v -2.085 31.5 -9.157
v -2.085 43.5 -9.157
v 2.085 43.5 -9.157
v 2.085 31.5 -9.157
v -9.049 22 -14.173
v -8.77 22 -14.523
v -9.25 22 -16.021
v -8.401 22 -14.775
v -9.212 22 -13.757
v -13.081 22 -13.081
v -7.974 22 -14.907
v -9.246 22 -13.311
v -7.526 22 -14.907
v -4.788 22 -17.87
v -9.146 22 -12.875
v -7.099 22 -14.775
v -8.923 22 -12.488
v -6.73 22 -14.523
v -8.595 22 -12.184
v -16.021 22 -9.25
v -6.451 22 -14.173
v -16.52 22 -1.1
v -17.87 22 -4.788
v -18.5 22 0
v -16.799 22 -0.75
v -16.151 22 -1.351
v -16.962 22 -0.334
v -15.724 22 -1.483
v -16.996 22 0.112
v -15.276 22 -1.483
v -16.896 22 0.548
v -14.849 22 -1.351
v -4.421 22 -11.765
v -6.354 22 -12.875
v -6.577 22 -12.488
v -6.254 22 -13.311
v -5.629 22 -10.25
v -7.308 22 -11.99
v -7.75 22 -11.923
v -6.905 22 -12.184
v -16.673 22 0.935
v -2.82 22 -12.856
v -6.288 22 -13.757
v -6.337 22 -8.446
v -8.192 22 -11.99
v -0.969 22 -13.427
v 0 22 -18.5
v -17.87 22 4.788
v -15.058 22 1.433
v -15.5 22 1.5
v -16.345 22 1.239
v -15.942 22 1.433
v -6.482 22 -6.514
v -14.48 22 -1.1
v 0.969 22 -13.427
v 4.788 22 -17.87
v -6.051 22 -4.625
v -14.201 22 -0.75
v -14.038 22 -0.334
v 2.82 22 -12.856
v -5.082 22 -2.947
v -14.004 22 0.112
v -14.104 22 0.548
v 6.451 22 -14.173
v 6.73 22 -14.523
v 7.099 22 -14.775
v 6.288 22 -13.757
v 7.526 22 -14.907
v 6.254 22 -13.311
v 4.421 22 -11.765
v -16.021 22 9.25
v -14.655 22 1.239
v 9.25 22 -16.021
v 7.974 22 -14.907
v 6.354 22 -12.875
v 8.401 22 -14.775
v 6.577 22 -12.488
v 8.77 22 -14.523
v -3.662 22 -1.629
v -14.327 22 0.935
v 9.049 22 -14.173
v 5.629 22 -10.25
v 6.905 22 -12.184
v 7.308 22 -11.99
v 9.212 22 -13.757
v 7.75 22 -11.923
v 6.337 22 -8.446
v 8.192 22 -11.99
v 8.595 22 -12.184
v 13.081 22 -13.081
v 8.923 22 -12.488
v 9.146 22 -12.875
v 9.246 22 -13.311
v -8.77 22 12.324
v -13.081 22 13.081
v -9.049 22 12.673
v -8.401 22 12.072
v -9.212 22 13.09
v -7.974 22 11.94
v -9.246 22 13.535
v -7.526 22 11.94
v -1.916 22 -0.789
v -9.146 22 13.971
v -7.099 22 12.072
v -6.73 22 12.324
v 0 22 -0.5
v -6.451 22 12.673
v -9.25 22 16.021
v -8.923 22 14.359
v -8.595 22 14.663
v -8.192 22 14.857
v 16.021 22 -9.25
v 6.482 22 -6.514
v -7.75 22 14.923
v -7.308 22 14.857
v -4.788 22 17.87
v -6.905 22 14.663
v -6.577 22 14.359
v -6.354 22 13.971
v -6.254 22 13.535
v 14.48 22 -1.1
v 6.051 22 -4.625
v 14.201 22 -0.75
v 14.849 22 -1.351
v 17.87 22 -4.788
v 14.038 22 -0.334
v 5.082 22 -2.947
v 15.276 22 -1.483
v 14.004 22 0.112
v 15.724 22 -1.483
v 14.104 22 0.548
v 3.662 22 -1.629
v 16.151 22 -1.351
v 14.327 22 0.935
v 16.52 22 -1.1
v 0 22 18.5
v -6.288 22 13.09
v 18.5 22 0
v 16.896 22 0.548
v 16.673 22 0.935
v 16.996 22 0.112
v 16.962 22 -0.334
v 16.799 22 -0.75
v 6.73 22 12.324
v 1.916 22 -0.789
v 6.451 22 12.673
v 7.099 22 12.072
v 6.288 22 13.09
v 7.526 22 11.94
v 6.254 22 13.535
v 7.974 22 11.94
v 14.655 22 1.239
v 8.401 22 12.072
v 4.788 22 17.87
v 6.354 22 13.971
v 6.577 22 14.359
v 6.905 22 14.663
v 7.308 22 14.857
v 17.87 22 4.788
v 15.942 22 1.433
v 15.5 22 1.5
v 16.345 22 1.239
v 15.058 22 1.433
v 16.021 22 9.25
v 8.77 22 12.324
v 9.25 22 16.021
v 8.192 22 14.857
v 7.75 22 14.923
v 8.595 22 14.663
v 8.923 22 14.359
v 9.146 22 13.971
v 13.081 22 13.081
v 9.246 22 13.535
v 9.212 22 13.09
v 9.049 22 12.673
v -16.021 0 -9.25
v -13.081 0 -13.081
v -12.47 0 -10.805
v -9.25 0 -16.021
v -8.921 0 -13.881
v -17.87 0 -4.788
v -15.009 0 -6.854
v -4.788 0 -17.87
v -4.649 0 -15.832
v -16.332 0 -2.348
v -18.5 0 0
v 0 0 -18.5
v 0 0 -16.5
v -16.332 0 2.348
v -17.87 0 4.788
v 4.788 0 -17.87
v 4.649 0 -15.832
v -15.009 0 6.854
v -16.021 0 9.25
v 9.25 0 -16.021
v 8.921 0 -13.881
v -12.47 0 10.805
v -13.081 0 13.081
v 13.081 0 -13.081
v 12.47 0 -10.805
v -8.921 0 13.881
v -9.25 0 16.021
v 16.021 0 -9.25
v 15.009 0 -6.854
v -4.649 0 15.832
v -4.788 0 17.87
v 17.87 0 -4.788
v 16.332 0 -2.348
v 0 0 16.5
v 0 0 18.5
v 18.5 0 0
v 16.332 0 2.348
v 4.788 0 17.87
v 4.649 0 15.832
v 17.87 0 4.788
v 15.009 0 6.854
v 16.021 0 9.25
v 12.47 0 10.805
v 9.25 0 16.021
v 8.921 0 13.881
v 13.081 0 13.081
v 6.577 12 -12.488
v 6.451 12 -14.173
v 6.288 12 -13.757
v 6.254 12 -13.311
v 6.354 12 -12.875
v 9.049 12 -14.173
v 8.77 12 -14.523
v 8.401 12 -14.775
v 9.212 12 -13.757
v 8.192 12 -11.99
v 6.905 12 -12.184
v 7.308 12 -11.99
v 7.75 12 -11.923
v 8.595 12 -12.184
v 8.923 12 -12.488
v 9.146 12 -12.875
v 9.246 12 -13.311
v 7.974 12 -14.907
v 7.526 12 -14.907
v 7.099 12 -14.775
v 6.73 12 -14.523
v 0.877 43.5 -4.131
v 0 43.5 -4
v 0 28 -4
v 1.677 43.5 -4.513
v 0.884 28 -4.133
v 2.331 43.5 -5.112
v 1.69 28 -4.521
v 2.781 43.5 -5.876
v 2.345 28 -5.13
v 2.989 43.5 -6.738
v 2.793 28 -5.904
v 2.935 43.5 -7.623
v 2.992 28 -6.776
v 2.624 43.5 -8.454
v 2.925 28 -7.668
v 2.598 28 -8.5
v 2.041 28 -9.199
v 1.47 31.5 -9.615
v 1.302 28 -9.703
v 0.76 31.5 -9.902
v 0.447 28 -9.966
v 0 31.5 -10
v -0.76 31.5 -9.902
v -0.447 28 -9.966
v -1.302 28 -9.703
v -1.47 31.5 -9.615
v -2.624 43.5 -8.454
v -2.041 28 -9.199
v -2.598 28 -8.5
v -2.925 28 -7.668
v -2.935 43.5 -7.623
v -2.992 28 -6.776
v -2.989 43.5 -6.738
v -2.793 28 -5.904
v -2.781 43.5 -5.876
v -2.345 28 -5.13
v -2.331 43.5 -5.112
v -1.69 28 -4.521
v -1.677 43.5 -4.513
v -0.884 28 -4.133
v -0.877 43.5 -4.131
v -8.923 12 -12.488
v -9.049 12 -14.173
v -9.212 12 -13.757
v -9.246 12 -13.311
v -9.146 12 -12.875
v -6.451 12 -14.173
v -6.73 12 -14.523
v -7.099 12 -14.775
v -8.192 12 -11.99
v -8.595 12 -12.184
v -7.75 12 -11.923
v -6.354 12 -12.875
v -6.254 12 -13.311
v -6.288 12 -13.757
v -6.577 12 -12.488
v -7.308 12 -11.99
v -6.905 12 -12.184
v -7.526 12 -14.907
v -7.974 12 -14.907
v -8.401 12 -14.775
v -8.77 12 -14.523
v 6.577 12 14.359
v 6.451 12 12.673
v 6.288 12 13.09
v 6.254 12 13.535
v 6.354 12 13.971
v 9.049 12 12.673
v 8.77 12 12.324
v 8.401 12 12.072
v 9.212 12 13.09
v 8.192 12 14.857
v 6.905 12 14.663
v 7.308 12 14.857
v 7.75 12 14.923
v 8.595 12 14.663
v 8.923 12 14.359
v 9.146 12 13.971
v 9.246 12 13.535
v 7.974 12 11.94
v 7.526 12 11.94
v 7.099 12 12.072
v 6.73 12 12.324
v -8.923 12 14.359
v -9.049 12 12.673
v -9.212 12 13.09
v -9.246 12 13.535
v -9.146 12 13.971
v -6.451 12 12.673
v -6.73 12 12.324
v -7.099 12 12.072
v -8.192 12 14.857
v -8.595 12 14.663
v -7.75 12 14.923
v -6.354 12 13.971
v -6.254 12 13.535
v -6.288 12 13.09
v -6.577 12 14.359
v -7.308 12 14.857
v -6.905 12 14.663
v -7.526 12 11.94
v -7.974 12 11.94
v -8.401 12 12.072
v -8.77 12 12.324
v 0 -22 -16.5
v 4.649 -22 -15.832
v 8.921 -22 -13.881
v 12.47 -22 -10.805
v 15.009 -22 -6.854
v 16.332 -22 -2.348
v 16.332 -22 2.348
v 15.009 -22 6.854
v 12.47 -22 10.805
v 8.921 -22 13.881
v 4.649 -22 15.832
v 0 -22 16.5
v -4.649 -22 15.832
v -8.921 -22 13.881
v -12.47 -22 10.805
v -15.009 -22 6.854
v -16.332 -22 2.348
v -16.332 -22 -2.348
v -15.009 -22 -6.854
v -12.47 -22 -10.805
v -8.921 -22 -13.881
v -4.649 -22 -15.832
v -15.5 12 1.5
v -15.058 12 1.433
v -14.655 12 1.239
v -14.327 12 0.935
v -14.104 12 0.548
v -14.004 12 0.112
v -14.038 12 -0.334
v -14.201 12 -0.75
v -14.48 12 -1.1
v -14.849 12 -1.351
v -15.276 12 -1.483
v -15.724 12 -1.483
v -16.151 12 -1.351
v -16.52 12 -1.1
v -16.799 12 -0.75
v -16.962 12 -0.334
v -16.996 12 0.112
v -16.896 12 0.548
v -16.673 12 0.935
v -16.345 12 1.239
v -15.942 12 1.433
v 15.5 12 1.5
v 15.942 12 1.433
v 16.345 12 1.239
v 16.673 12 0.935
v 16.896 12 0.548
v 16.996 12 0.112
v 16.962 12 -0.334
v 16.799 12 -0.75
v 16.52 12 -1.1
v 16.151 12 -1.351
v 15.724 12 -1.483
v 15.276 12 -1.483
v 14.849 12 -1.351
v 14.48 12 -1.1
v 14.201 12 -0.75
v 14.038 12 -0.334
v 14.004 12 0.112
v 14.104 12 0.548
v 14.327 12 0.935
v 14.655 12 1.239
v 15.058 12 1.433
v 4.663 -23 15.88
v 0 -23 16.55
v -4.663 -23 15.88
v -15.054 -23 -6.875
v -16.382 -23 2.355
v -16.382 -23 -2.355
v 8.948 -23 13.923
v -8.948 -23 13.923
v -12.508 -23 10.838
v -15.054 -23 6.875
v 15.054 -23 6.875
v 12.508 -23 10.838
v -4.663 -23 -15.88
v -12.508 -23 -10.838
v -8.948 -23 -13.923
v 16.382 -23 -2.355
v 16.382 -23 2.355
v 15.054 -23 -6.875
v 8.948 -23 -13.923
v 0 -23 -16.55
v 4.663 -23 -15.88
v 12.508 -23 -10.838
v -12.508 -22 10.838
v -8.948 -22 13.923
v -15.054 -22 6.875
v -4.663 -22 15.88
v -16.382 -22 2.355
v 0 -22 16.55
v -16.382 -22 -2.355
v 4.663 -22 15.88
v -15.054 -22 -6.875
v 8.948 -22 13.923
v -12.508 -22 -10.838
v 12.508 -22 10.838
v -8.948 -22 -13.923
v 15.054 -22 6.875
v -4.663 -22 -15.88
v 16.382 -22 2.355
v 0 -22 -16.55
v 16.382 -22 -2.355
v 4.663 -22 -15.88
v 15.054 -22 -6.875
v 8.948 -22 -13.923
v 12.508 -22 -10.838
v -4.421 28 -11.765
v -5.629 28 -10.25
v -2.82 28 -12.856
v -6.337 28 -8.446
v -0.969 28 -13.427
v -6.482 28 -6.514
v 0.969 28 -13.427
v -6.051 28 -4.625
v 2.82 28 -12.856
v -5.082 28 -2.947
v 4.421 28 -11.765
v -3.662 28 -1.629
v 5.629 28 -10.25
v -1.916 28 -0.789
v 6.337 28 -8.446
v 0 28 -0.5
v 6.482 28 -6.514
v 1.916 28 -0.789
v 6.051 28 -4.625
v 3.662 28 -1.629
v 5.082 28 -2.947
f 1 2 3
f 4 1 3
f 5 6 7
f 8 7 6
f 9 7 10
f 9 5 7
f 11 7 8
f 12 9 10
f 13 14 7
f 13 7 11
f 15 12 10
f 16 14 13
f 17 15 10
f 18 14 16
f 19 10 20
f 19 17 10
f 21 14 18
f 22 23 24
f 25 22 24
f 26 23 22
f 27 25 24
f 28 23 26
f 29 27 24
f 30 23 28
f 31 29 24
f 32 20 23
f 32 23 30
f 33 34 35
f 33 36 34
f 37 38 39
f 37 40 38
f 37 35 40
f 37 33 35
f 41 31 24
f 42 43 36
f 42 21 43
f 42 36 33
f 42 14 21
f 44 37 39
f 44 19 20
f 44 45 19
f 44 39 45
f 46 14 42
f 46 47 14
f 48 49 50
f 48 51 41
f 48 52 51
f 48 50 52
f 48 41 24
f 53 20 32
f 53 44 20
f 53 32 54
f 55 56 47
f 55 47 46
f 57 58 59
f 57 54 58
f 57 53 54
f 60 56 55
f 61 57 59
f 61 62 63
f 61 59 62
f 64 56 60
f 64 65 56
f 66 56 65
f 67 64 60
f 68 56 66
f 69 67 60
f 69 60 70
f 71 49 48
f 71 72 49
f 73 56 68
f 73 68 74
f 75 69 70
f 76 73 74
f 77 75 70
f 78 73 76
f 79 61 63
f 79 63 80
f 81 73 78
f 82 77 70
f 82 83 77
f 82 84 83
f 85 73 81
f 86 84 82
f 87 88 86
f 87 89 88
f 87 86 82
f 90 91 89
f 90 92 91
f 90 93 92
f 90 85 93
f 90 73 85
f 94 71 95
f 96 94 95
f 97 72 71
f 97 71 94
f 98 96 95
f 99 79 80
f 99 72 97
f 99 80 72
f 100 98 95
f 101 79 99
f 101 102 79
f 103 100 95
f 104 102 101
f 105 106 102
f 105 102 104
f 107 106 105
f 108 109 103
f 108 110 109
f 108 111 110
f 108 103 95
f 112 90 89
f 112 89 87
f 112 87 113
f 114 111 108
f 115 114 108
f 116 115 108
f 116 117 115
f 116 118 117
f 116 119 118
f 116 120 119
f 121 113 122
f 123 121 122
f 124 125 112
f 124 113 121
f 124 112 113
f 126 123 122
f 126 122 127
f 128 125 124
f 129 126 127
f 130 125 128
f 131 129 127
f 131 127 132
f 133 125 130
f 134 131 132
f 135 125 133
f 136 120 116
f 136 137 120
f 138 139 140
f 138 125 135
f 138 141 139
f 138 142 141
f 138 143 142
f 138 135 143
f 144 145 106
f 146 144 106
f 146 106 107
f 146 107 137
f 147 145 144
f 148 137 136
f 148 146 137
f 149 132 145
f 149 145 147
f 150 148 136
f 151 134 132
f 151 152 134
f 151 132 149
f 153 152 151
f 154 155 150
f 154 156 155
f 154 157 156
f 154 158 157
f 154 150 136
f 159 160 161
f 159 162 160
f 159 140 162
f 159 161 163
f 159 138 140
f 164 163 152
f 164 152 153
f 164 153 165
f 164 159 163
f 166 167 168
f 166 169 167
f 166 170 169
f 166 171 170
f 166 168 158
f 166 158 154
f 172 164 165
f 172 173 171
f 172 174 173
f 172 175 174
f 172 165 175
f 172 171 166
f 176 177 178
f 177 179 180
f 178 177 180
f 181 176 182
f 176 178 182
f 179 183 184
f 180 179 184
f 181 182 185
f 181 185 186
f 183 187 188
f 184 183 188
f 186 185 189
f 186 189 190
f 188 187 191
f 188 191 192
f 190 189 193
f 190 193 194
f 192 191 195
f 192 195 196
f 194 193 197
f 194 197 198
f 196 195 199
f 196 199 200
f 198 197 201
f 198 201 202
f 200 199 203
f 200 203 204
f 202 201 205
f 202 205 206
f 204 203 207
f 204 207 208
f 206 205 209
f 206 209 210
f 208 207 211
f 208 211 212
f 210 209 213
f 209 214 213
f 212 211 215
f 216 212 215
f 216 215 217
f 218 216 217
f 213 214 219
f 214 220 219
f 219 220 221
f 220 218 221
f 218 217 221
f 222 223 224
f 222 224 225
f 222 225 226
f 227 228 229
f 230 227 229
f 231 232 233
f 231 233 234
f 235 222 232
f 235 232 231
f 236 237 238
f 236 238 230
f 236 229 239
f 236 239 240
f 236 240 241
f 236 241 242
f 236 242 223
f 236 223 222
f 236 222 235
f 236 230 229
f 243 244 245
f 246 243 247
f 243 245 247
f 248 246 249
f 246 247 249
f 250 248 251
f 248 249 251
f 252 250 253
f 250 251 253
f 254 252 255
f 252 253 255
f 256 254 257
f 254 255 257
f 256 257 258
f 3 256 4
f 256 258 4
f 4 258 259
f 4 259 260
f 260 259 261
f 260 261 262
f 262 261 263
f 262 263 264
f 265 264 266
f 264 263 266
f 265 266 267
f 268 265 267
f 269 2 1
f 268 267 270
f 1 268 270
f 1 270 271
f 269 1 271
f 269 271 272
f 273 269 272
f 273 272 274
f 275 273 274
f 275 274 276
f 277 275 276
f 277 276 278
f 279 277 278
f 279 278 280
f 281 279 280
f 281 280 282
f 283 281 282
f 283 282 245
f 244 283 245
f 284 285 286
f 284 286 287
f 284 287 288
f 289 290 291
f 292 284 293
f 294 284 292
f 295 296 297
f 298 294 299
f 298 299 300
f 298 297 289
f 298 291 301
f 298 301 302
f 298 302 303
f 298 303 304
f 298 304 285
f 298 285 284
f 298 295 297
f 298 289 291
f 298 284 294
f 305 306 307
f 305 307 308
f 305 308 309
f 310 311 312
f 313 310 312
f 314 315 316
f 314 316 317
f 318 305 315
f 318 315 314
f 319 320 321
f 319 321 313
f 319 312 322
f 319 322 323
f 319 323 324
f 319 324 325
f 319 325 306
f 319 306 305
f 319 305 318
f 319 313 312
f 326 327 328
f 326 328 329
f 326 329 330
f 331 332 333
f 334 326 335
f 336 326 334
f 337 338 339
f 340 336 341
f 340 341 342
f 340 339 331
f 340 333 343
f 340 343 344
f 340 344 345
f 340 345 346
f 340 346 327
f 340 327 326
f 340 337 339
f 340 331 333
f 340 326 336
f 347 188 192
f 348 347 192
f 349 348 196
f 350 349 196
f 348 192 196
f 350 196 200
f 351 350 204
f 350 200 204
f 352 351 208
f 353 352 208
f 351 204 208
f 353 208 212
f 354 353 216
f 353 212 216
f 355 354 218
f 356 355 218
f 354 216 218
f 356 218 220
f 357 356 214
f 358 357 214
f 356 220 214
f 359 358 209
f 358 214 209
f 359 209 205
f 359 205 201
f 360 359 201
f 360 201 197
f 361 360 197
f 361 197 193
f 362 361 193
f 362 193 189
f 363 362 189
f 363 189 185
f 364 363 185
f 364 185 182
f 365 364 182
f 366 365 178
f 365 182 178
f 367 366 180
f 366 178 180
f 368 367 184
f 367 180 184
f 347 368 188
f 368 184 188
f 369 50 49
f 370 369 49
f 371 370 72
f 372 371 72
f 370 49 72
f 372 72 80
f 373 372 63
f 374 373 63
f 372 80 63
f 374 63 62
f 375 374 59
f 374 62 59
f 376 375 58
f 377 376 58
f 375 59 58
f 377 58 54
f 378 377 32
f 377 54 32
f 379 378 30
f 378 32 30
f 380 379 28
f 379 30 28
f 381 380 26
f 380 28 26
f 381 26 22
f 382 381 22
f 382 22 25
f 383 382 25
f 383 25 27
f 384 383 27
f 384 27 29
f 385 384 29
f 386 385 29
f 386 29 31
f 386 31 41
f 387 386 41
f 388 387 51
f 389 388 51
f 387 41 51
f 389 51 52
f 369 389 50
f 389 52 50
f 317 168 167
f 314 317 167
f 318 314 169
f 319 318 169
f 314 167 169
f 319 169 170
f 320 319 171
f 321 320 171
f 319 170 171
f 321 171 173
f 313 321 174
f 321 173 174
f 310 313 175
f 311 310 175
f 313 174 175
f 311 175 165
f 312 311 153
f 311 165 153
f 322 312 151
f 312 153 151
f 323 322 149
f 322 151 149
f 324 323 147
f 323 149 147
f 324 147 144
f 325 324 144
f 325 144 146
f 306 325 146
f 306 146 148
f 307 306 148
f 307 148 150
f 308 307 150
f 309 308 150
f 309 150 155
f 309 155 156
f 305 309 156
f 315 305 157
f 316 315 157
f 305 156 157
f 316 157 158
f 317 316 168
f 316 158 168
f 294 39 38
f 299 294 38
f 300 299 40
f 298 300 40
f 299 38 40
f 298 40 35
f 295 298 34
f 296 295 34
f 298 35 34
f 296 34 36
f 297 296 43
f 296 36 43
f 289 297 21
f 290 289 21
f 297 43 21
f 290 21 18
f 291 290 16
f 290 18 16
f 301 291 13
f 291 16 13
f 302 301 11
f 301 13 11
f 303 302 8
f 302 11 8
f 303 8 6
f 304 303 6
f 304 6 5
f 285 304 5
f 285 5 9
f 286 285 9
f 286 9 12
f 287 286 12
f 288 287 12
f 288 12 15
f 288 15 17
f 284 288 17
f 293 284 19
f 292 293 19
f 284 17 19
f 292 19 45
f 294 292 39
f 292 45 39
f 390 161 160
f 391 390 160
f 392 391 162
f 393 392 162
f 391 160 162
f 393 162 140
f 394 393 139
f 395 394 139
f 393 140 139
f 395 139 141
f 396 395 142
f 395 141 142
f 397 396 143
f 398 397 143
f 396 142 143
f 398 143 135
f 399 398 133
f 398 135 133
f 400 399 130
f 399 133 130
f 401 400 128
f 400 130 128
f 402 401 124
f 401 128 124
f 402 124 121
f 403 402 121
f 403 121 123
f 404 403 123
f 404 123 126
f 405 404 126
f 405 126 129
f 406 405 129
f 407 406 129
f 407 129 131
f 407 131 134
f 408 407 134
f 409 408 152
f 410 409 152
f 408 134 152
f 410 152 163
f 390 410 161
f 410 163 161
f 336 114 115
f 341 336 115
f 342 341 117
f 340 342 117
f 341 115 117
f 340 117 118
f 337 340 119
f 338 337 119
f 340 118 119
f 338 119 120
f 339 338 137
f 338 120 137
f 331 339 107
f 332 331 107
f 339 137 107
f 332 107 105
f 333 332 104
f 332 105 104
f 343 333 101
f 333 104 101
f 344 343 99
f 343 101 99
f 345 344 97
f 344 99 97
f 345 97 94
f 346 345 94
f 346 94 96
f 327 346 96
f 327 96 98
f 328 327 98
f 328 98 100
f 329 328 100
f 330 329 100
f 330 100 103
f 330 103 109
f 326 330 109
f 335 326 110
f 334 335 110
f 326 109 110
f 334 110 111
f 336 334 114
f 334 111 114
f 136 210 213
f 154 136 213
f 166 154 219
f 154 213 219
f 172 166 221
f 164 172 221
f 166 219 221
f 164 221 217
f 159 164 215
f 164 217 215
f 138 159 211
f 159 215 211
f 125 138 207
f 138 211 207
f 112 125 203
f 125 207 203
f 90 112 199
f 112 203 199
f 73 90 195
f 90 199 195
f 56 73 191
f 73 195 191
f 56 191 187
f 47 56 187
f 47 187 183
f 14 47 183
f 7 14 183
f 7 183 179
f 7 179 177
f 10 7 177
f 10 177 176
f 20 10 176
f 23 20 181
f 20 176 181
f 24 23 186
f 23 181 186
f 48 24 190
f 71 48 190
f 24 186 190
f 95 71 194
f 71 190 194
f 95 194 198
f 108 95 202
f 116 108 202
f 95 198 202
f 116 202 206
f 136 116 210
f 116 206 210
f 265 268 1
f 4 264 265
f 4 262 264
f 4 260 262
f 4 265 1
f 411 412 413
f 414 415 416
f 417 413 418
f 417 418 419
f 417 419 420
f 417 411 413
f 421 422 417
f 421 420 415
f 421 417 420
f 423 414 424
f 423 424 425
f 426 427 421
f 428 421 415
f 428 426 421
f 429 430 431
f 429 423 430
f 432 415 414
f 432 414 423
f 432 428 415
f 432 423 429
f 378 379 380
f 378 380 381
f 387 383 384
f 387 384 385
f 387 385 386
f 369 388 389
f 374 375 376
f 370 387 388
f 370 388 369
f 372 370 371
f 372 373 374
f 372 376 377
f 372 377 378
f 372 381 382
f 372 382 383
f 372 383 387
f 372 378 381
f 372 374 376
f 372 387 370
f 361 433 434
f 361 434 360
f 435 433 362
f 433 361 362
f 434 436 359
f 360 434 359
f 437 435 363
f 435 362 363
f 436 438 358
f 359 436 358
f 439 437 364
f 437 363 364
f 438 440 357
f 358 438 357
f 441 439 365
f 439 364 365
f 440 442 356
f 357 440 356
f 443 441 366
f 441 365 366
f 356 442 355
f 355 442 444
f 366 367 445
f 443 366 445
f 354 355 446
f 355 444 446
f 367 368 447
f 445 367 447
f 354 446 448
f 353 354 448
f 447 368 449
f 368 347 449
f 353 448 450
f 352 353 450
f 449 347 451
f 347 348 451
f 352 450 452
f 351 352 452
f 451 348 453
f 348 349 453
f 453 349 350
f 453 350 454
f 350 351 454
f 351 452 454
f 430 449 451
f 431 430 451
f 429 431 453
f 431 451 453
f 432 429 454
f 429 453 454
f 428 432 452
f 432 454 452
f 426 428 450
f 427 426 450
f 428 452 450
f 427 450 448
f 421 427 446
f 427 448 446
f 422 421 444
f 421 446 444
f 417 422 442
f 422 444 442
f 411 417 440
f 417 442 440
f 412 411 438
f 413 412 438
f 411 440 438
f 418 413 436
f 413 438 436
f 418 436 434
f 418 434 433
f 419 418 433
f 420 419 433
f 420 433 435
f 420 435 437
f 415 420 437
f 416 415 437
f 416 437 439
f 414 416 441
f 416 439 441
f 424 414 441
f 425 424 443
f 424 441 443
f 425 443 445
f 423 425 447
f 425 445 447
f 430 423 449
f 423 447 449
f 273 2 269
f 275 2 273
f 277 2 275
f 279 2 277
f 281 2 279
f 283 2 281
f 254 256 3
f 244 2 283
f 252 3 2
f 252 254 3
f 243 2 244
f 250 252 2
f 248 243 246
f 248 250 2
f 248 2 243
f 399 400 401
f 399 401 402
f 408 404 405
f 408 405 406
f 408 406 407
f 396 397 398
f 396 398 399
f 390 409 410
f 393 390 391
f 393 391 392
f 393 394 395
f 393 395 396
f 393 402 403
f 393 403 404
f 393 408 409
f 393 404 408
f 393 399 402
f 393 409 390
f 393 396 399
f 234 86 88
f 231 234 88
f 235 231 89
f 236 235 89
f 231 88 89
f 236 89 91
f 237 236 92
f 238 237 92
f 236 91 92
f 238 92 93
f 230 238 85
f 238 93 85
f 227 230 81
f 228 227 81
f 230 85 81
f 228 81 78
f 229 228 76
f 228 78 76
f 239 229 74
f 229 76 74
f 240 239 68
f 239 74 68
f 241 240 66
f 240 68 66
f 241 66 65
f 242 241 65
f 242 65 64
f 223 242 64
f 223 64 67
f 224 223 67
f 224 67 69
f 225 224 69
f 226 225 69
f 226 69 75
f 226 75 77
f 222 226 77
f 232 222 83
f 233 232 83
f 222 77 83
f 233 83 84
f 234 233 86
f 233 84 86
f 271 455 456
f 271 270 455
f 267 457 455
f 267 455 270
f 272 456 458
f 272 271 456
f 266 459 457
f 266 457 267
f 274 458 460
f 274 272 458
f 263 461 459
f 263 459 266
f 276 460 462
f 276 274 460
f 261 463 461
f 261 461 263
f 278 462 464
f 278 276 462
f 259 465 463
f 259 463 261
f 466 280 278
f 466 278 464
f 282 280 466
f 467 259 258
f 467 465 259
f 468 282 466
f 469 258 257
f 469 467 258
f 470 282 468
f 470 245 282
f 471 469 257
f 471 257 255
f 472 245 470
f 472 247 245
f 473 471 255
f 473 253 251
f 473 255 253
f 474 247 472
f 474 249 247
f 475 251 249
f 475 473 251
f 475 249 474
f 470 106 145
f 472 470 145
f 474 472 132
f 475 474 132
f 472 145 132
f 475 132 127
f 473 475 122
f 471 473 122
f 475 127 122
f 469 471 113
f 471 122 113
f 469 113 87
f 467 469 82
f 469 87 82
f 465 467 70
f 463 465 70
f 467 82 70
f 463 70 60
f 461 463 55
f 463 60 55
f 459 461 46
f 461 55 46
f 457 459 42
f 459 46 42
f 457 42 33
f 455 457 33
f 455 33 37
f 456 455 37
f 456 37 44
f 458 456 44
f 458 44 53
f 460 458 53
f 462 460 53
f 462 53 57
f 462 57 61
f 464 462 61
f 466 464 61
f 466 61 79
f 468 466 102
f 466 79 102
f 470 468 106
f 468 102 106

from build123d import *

# Parameters (mm, degrees)
SKETCH1_R           = 18.5
BOSS_EXTRUDE1_DEPTH = 22
SKETCH2_R           = 16.5
BOSS_EXTRUDE2_DEPTH = 22
SKETCH3_R           = 16.55
BOSS_EXTRUDE3_DEPTH = 1
SKETCH4_R           = 6.5
BOSS_EXTRUDE4_DEPTH = 6
SKETCH6_R           = 3
BOSS_EXTRUDE5_DEPTH = 15.5
CUT_EXTRUDE1_DEPTH  = 12
SKETCH8_R           = 1.5
CUT_EXTRUDE2_DEPTH  = 10


with BuildPart() as part:
    # Sketch1 → Boss-Extrude1 (new body)
    with BuildSketch(Plane(origin=(0, 0, 0), x_dir=(1, 0, 0), z_dir=(0, 1, 0))):
        with Locations(Location((0, 0, 0), (0, 0, 270))):
            Circle(SKETCH1_R)
    extrude(amount=BOSS_EXTRUDE1_DEPTH)

    # Sketch2 → Boss-Extrude2 (add)
    with BuildSketch(Plane.XZ):
        with Locations(Location((0, 0, 0), (0, 0, 270))):
            Circle(SKETCH2_R)
    extrude(amount=BOSS_EXTRUDE2_DEPTH)

    # Sketch3 → Boss-Extrude3 (add)
    with BuildSketch(Plane.XZ.offset(22)):
        with Locations(Location((0, 0, 0), (0, 0, 270))):
            Circle(SKETCH3_R)
    extrude(amount=BOSS_EXTRUDE3_DEPTH)

    # Sketch4 → Boss-Extrude4 (add)
    with BuildSketch(Plane(origin=(0, 22, 0), x_dir=(1, 0, 0), z_dir=(0, 1, 0))):
        with Locations(Location((0, 7, 0), (0, 0, 270))):
            Circle(SKETCH4_R)
    extrude(amount=BOSS_EXTRUDE4_DEPTH)

    # Sketch6 → Boss-Extrude5 (add)
    with BuildSketch(Plane(origin=(0, 28, 0), x_dir=(1, 0, 0), z_dir=(0, 1, 0))):
        with Locations(Location((0, 7, 0), (0, 0, 270))):
            Circle(SKETCH6_R)
    extrude(amount=BOSS_EXTRUDE5_DEPTH)

    # Sketch7 → Cut-Extrude1 (cut)
    with BuildSketch(Plane(origin=(0, 43.5, 0), x_dir=(1, 0, 0), z_dir=(0, 1, 0))):
        Polygon((-2.084617871, 9.15739851), (2.084617871, 9.15739851), (2.280696351, 9.15739851), (2.280696351, 10.992904137), (-3.0808507, 10.992904137), (-3.0808507, 9.15739851), align=None)
    extrude(amount=-CUT_EXTRUDE1_DEPTH, mode=Mode.SUBTRACT)

    # Sketch8 → Cut-Extrude2 (cut)
    with BuildSketch(Plane(origin=(0, 22, 0), x_dir=(1, 0, 0), z_dir=(0, 1, 0))):
        with Locations(Location((15.5, 0, 0), (0, 0, 270))):
            Circle(SKETCH8_R)
        with Locations(Location((7.75, -13.423393759, 0), (0, 0, 270))):
            Circle(SKETCH8_R)
        with Locations(Location((-7.75, -13.423393759, 0), (0, 0, 270))):
            Circle(SKETCH8_R)
        with Locations(Location((-15.5, 0, 0), (0, 0, 270))):
            Circle(SKETCH8_R)
        with Locations(Location((-7.75, 13.423393759, 0), (0, 0, 270))):
            Circle(SKETCH8_R)
        with Locations(Location((7.75, 13.423393759, 0), (0, 0, 270))):
            Circle(SKETCH8_R)
    extrude(amount=-CUT_EXTRUDE2_DEPTH, mode=Mode.SUBTRACT)


solid = part.part
